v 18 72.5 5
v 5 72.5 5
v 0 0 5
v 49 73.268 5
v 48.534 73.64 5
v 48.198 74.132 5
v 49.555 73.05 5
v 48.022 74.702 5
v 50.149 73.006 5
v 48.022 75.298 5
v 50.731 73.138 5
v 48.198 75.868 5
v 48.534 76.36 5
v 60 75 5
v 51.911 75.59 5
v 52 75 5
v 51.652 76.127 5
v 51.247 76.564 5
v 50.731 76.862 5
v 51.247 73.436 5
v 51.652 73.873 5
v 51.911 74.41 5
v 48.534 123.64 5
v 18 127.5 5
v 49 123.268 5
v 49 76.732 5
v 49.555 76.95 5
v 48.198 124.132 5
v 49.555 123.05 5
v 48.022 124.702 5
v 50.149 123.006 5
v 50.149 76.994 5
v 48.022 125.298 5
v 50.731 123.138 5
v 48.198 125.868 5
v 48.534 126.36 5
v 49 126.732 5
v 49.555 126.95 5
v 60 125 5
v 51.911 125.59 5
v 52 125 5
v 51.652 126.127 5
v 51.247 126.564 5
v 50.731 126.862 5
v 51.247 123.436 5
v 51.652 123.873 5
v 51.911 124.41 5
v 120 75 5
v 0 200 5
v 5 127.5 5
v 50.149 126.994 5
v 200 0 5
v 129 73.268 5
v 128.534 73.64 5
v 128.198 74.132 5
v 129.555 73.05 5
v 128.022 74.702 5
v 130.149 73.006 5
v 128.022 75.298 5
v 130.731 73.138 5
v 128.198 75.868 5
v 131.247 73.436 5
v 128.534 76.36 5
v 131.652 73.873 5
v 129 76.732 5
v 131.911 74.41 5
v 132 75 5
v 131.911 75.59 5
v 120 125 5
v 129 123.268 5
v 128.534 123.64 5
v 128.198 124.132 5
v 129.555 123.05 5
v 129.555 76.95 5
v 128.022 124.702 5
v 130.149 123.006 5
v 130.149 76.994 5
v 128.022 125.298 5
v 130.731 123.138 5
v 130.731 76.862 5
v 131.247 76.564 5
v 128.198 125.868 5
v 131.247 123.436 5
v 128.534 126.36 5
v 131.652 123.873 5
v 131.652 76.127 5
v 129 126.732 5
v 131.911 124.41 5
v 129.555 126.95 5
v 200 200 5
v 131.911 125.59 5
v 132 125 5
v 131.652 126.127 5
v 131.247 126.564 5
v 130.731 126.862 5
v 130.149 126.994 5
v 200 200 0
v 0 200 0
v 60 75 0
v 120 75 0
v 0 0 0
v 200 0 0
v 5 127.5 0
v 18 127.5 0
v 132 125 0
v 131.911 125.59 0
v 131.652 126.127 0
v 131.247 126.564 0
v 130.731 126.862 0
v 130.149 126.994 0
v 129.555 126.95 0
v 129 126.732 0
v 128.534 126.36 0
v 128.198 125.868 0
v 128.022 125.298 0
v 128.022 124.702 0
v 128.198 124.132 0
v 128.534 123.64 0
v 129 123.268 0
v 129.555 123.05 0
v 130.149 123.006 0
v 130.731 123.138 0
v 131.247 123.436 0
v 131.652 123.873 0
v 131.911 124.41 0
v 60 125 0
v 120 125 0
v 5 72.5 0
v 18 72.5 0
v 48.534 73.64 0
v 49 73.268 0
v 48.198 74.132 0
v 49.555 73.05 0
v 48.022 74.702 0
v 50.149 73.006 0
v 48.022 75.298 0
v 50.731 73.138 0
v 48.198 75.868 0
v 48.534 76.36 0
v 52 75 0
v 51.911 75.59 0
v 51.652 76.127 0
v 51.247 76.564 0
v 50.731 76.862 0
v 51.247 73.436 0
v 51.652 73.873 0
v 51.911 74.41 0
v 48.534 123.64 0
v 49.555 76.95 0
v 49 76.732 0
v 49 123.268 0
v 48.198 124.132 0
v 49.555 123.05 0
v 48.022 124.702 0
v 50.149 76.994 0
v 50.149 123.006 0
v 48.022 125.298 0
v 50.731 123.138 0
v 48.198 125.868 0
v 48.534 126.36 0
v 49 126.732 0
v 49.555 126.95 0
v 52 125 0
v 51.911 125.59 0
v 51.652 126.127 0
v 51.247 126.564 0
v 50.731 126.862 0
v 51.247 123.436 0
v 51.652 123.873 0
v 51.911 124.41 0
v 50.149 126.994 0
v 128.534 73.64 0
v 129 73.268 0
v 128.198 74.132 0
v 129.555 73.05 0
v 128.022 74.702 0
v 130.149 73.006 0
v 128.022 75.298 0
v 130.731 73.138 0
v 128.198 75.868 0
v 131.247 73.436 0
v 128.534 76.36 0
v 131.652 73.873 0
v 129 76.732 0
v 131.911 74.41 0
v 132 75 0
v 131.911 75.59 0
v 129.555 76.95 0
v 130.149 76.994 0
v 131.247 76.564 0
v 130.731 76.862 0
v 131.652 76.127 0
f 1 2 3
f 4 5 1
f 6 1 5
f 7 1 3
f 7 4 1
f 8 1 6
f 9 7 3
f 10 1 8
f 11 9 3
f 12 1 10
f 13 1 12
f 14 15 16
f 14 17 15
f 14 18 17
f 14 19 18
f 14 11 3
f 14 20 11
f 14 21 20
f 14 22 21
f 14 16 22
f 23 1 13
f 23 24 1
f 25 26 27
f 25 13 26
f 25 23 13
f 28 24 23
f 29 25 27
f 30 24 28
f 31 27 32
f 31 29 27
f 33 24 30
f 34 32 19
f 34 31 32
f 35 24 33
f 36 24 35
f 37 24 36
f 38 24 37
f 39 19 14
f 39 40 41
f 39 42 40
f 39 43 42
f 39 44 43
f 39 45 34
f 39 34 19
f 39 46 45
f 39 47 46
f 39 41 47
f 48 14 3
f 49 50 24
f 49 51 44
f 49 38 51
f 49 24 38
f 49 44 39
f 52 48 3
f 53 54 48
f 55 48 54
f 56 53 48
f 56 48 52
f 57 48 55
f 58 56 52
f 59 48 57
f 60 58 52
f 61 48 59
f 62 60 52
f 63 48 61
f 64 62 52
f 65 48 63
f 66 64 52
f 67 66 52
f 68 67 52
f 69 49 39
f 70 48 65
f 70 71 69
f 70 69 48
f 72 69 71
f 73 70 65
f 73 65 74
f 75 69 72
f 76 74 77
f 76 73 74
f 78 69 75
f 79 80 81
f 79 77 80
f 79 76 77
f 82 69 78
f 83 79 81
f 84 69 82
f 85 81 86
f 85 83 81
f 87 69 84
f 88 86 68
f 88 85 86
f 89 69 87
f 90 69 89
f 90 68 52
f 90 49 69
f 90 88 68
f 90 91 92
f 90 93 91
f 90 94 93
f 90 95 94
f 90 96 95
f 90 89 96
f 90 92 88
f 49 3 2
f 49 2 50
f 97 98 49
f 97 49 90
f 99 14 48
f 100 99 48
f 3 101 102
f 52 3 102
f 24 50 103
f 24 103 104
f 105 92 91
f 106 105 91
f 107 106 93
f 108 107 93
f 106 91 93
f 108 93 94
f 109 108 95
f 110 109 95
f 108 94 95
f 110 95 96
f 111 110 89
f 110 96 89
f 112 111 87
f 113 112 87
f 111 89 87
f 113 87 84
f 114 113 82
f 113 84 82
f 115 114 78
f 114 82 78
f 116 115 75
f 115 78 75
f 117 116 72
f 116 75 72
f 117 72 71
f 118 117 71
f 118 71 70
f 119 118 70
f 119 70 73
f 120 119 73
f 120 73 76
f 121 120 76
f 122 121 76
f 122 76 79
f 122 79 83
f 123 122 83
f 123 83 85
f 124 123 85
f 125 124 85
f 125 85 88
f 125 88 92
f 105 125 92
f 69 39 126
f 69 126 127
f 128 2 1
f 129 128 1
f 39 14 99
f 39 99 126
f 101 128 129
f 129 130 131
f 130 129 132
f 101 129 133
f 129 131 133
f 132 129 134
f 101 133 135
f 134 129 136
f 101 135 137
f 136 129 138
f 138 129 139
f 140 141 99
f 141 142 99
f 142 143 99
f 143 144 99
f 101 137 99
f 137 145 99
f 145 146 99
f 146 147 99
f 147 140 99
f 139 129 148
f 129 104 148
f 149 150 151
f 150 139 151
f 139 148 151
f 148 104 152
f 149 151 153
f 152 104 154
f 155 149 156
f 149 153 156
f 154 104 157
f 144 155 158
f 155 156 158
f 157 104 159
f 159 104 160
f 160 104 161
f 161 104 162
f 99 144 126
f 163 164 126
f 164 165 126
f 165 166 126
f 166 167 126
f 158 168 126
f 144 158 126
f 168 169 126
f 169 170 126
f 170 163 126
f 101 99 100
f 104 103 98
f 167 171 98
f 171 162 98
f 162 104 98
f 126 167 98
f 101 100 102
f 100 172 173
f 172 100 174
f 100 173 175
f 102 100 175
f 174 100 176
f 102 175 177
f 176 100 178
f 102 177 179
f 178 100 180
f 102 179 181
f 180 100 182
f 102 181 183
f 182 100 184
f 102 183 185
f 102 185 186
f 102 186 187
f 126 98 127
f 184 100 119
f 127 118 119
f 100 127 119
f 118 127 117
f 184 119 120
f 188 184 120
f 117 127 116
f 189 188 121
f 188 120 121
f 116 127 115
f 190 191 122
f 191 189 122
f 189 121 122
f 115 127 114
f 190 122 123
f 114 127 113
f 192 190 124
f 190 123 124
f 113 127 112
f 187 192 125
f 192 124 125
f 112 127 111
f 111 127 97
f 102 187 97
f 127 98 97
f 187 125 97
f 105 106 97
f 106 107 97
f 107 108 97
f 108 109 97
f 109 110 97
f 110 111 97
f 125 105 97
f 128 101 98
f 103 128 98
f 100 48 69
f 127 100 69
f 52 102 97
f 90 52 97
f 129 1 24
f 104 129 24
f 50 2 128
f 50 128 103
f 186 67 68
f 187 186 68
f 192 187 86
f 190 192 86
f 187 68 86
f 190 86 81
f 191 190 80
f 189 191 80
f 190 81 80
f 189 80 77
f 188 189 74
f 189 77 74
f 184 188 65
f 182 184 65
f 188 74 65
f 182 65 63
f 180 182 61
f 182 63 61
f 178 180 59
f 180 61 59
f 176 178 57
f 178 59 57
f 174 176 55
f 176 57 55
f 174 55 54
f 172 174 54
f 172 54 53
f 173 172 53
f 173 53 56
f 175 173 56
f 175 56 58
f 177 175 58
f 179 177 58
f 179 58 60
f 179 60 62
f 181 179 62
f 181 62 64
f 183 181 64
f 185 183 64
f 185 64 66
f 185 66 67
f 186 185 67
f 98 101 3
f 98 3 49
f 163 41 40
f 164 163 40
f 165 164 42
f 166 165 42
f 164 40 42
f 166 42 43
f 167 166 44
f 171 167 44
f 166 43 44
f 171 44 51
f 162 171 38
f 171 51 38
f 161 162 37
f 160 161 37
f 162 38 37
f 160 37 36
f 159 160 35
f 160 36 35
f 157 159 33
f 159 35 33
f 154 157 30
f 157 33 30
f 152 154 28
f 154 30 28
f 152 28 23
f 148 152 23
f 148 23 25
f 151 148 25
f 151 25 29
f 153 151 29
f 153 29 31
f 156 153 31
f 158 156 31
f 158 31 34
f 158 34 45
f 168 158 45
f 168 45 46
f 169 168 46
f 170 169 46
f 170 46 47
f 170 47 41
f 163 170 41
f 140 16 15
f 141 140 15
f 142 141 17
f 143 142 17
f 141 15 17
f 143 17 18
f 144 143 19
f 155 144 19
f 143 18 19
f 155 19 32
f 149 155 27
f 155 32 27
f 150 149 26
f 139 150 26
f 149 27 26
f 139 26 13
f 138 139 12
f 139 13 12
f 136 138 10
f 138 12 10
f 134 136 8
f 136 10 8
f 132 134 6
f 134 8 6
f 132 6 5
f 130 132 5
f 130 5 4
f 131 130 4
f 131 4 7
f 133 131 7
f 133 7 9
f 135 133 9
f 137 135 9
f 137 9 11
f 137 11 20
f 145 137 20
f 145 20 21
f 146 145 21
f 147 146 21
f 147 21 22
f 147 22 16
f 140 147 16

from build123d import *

# Parameters (mm, degrees)
ESQUISSE1_W             = 200
ESQUISSE1_H             = 200
BOSS_EXTRU_1_DEPTH      = 5
ESQUISSE2_R             = 2
ENL_V_MAT_EXTRU_1_DEPTH = 10
ESQUISSE3_W             = 13
ESQUISSE3_H             = 55
ENL_V_MAT_EXTRU_2_DEPTH = 10
ESQUISSE4_W             = 60
ESQUISSE4_H             = 50
ENL_V_MAT_EXTRU_3_DEPTH = 12


with BuildPart() as part:
    # Esquisse1 → Boss.-Extru.1 (new body)
    with BuildSketch(Plane.XY):
        with Locations((100, 100)):
            Rectangle(ESQUISSE1_W, ESQUISSE1_H)
    extrude(amount=BOSS_EXTRU_1_DEPTH)

    # Esquisse2 → Enlèv. mat.-Extru.1 (cut)
    with BuildSketch(Plane.XY.offset(5)):
        with Locations((50, 125)):
            Circle(ESQUISSE2_R)
        with Locations((50, 75)):
            Circle(ESQUISSE2_R)
        with Locations((130, 125)):
            Circle(ESQUISSE2_R)
        with Locations((130, 75)):
            Circle(ESQUISSE2_R)
    extrude(amount=-ENL_V_MAT_EXTRU_1_DEPTH, mode=Mode.SUBTRACT)

    # Esquisse3 → Enlèv. mat.-Extru.2 (cut)
    with BuildSketch(Plane.XY.offset(5)):
        with Locations((11.5, 100)):
            Rectangle(ESQUISSE3_W, ESQUISSE3_H)
    extrude(amount=-ENL_V_MAT_EXTRU_2_DEPTH, mode=Mode.SUBTRACT)

    # Esquisse4 → Enlèv. mat.-Extru.3 (cut)
    with BuildSketch(Plane.XY.offset(5)):
        with Locations((90, 100)):
            Rectangle(ESQUISSE4_W, ESQUISSE4_H)
    extrude(amount=-ENL_V_MAT_EXTRU_3_DEPTH, mode=Mode.SUBTRACT)


solid = part.part
